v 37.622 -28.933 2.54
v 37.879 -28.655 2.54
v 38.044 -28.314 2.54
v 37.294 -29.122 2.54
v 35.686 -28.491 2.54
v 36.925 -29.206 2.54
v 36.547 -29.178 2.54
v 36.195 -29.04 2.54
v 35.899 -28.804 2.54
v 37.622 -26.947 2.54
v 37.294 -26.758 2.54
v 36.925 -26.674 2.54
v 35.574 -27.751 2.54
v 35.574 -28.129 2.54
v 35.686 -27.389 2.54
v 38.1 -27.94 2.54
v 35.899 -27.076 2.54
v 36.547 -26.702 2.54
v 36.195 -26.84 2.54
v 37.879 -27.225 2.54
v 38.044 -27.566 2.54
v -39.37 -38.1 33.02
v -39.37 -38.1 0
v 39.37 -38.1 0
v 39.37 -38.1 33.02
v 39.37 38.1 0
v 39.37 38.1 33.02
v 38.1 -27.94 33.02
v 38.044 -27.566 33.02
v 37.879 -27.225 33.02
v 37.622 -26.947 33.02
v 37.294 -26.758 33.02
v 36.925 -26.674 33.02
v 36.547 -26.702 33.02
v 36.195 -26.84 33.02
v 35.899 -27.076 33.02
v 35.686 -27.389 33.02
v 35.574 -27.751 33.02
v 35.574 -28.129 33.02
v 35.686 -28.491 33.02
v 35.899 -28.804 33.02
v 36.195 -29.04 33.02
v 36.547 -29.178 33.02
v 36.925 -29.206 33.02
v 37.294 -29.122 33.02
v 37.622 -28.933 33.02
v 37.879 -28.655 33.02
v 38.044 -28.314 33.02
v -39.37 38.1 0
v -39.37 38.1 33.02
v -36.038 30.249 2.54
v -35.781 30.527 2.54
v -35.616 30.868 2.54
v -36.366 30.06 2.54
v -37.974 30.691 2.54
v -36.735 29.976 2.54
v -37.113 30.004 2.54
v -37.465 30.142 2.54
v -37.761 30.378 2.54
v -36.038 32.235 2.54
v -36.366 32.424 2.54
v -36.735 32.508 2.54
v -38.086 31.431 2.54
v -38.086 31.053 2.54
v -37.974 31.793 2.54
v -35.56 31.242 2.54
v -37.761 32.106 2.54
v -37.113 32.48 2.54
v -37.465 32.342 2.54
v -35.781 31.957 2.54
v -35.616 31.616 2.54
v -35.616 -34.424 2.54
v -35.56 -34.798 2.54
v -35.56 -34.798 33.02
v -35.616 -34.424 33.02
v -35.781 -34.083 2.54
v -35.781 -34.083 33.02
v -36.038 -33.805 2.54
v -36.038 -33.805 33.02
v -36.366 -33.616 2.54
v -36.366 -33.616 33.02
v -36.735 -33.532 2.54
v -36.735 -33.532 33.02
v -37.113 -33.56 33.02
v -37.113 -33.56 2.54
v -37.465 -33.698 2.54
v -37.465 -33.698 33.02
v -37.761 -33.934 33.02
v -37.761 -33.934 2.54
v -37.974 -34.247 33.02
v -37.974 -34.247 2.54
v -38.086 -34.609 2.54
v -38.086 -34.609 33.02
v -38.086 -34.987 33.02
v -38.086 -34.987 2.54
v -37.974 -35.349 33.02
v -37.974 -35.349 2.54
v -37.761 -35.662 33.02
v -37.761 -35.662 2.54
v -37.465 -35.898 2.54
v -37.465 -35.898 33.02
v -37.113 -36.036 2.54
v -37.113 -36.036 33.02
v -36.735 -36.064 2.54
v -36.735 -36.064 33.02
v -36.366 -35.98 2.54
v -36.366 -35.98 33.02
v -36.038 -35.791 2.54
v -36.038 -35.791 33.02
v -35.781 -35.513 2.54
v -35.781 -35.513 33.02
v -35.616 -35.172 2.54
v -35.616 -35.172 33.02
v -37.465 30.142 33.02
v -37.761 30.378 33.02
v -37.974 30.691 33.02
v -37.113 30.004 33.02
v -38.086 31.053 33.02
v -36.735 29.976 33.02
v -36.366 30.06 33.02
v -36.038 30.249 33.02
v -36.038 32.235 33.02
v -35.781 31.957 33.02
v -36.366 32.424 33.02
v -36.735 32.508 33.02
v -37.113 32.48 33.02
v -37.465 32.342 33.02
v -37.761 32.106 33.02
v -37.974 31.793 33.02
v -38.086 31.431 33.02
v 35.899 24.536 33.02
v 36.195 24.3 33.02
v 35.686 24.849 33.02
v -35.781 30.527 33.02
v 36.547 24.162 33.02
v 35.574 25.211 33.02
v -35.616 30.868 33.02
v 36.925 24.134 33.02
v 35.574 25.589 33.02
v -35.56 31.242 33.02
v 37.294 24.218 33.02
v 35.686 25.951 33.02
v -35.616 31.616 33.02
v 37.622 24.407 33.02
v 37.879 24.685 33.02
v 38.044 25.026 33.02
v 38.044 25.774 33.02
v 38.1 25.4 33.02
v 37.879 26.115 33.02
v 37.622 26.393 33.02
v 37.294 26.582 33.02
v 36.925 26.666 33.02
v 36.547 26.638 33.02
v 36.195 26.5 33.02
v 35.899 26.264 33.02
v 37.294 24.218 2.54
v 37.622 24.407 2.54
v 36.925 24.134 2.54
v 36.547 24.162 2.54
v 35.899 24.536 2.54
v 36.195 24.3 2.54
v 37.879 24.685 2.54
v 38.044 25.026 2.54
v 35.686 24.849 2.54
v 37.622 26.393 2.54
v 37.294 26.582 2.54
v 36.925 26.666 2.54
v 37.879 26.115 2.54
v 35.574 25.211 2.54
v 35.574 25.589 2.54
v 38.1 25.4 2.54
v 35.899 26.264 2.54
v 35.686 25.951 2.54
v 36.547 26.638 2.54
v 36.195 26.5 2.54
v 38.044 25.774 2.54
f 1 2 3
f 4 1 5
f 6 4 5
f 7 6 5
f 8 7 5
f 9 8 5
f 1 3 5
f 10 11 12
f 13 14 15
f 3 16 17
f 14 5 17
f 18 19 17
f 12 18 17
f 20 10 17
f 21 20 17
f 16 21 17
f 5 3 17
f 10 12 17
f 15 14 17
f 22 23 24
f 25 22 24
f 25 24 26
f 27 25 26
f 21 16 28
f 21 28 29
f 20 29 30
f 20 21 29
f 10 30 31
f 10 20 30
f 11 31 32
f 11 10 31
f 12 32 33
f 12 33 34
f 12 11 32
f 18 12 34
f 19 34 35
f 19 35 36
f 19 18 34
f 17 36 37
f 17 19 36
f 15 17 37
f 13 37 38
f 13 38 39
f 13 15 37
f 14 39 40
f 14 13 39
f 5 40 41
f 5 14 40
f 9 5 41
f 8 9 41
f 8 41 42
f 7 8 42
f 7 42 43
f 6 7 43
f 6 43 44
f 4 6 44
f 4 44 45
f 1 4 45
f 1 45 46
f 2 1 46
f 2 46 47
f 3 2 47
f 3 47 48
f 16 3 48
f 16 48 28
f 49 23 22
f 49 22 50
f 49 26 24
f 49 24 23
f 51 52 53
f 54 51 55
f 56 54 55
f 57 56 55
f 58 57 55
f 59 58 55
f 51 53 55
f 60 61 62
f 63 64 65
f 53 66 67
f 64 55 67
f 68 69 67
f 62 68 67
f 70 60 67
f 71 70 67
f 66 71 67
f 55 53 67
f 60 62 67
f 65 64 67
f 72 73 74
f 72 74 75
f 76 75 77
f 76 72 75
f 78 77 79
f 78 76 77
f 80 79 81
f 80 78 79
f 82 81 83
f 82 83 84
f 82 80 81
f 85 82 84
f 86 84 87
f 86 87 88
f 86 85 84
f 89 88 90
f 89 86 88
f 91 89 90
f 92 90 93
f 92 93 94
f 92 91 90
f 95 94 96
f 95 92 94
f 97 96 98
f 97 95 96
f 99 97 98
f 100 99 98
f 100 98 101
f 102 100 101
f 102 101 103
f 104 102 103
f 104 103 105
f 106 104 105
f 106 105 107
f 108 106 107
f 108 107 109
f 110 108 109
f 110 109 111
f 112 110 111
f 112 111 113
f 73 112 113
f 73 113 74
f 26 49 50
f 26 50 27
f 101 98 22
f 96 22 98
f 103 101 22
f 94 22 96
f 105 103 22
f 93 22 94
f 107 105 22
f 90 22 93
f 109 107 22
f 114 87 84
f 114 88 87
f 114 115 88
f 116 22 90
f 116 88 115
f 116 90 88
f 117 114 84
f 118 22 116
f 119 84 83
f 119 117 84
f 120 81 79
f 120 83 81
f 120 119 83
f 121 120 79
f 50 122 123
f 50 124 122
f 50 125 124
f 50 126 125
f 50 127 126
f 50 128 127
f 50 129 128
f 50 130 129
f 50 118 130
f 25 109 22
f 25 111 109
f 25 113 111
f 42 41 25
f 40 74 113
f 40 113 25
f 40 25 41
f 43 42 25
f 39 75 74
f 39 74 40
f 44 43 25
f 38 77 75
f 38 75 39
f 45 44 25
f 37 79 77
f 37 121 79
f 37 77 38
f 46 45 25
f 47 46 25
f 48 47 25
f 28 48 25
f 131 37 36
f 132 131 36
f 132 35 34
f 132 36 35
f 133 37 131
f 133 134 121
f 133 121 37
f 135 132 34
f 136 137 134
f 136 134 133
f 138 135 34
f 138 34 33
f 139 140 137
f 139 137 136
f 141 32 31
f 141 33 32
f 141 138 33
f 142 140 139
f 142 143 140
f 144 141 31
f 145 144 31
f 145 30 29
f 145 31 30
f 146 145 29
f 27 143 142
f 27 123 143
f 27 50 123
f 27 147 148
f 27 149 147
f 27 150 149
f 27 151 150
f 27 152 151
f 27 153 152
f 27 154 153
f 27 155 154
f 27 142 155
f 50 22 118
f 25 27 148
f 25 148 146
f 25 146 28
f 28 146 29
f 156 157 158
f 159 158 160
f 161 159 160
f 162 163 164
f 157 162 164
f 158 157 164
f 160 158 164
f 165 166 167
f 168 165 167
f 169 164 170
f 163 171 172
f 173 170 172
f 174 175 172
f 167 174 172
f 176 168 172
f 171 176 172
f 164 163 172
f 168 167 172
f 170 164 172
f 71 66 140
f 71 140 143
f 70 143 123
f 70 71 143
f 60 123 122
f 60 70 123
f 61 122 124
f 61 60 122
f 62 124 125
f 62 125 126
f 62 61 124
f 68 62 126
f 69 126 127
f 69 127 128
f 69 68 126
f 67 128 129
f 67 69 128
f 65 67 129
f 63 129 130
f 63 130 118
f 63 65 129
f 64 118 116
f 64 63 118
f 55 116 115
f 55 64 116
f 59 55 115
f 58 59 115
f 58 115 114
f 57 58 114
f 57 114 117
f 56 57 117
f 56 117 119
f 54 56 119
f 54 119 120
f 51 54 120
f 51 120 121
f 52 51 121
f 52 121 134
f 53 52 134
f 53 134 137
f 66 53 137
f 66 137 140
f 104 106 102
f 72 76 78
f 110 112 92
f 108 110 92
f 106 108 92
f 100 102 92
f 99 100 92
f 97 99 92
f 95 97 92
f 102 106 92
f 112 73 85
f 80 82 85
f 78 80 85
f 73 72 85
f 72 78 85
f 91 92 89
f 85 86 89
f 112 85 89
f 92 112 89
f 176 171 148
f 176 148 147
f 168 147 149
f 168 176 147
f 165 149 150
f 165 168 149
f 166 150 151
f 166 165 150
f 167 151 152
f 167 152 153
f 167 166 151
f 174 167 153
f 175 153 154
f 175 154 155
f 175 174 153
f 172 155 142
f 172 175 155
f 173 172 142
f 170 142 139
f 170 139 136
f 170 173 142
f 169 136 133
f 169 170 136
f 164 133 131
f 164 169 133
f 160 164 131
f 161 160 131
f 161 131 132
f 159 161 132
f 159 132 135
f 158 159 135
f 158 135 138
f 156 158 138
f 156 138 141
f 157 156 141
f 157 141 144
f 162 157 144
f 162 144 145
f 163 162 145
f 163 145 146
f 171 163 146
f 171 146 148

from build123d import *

# Parameters (mm, degrees)
SKETCH1_W           = 78.74
SKETCH1_H           = 76.2
SKETCH1_R           = 1.27
BOSS_EXTRUDE1_DEPTH = 33.02
SKETCH2_R           = 1.27
BOSS_EXTRUDE2_DEPTH = 2.54
SKETCH3_R           = 1.27
BOSS_EXTRUDE3_DEPTH = 2.54


with BuildPart() as part:
    # Sketch1 → Boss-Extrude1 (new body)
    with BuildSketch(Plane.XY):
        Rectangle(SKETCH1_W, SKETCH1_H)
        with Locations((36.83, 25.4)):
            Circle(SKETCH1_R, mode=Mode.SUBTRACT)
        with Locations((36.83, -27.94)):
            Circle(SKETCH1_R, mode=Mode.SUBTRACT)
        with Locations((-36.83, 31.242)):
            Circle(SKETCH1_R, mode=Mode.SUBTRACT)
        with Locations((-36.83, -34.798)):
            Circle(SKETCH1_R, mode=Mode.SUBTRACT)
    extrude(amount=BOSS_EXTRUDE1_DEPTH)

    # Sketch2 → Boss-Extrude2 (add)
    with BuildSketch(Plane(origin=(0, 0, 0), x_dir=(-1, 0, 0), z_dir=(0, 0, -1))):
        with Locations((-36.83, 25.4)):
            Circle(SKETCH2_R)
    extrude(amount=-BOSS_EXTRUDE2_DEPTH)

    # Sketch3 → Boss-Extrude3 (add)
    with BuildSketch(Plane(origin=(0, 0, 0), x_dir=(-1, 0, 0), z_dir=(0, 0, -1))):
        with Locations((36.83, 31.242)):
            Circle(SKETCH3_R)
        with Locations((36.83, -34.798)):
            Circle(SKETCH3_R)
        with Locations((-36.83, -27.94)):
            Circle(SKETCH3_R)
    extrude(amount=-BOSS_EXTRUDE3_DEPTH)


solid = part.part
